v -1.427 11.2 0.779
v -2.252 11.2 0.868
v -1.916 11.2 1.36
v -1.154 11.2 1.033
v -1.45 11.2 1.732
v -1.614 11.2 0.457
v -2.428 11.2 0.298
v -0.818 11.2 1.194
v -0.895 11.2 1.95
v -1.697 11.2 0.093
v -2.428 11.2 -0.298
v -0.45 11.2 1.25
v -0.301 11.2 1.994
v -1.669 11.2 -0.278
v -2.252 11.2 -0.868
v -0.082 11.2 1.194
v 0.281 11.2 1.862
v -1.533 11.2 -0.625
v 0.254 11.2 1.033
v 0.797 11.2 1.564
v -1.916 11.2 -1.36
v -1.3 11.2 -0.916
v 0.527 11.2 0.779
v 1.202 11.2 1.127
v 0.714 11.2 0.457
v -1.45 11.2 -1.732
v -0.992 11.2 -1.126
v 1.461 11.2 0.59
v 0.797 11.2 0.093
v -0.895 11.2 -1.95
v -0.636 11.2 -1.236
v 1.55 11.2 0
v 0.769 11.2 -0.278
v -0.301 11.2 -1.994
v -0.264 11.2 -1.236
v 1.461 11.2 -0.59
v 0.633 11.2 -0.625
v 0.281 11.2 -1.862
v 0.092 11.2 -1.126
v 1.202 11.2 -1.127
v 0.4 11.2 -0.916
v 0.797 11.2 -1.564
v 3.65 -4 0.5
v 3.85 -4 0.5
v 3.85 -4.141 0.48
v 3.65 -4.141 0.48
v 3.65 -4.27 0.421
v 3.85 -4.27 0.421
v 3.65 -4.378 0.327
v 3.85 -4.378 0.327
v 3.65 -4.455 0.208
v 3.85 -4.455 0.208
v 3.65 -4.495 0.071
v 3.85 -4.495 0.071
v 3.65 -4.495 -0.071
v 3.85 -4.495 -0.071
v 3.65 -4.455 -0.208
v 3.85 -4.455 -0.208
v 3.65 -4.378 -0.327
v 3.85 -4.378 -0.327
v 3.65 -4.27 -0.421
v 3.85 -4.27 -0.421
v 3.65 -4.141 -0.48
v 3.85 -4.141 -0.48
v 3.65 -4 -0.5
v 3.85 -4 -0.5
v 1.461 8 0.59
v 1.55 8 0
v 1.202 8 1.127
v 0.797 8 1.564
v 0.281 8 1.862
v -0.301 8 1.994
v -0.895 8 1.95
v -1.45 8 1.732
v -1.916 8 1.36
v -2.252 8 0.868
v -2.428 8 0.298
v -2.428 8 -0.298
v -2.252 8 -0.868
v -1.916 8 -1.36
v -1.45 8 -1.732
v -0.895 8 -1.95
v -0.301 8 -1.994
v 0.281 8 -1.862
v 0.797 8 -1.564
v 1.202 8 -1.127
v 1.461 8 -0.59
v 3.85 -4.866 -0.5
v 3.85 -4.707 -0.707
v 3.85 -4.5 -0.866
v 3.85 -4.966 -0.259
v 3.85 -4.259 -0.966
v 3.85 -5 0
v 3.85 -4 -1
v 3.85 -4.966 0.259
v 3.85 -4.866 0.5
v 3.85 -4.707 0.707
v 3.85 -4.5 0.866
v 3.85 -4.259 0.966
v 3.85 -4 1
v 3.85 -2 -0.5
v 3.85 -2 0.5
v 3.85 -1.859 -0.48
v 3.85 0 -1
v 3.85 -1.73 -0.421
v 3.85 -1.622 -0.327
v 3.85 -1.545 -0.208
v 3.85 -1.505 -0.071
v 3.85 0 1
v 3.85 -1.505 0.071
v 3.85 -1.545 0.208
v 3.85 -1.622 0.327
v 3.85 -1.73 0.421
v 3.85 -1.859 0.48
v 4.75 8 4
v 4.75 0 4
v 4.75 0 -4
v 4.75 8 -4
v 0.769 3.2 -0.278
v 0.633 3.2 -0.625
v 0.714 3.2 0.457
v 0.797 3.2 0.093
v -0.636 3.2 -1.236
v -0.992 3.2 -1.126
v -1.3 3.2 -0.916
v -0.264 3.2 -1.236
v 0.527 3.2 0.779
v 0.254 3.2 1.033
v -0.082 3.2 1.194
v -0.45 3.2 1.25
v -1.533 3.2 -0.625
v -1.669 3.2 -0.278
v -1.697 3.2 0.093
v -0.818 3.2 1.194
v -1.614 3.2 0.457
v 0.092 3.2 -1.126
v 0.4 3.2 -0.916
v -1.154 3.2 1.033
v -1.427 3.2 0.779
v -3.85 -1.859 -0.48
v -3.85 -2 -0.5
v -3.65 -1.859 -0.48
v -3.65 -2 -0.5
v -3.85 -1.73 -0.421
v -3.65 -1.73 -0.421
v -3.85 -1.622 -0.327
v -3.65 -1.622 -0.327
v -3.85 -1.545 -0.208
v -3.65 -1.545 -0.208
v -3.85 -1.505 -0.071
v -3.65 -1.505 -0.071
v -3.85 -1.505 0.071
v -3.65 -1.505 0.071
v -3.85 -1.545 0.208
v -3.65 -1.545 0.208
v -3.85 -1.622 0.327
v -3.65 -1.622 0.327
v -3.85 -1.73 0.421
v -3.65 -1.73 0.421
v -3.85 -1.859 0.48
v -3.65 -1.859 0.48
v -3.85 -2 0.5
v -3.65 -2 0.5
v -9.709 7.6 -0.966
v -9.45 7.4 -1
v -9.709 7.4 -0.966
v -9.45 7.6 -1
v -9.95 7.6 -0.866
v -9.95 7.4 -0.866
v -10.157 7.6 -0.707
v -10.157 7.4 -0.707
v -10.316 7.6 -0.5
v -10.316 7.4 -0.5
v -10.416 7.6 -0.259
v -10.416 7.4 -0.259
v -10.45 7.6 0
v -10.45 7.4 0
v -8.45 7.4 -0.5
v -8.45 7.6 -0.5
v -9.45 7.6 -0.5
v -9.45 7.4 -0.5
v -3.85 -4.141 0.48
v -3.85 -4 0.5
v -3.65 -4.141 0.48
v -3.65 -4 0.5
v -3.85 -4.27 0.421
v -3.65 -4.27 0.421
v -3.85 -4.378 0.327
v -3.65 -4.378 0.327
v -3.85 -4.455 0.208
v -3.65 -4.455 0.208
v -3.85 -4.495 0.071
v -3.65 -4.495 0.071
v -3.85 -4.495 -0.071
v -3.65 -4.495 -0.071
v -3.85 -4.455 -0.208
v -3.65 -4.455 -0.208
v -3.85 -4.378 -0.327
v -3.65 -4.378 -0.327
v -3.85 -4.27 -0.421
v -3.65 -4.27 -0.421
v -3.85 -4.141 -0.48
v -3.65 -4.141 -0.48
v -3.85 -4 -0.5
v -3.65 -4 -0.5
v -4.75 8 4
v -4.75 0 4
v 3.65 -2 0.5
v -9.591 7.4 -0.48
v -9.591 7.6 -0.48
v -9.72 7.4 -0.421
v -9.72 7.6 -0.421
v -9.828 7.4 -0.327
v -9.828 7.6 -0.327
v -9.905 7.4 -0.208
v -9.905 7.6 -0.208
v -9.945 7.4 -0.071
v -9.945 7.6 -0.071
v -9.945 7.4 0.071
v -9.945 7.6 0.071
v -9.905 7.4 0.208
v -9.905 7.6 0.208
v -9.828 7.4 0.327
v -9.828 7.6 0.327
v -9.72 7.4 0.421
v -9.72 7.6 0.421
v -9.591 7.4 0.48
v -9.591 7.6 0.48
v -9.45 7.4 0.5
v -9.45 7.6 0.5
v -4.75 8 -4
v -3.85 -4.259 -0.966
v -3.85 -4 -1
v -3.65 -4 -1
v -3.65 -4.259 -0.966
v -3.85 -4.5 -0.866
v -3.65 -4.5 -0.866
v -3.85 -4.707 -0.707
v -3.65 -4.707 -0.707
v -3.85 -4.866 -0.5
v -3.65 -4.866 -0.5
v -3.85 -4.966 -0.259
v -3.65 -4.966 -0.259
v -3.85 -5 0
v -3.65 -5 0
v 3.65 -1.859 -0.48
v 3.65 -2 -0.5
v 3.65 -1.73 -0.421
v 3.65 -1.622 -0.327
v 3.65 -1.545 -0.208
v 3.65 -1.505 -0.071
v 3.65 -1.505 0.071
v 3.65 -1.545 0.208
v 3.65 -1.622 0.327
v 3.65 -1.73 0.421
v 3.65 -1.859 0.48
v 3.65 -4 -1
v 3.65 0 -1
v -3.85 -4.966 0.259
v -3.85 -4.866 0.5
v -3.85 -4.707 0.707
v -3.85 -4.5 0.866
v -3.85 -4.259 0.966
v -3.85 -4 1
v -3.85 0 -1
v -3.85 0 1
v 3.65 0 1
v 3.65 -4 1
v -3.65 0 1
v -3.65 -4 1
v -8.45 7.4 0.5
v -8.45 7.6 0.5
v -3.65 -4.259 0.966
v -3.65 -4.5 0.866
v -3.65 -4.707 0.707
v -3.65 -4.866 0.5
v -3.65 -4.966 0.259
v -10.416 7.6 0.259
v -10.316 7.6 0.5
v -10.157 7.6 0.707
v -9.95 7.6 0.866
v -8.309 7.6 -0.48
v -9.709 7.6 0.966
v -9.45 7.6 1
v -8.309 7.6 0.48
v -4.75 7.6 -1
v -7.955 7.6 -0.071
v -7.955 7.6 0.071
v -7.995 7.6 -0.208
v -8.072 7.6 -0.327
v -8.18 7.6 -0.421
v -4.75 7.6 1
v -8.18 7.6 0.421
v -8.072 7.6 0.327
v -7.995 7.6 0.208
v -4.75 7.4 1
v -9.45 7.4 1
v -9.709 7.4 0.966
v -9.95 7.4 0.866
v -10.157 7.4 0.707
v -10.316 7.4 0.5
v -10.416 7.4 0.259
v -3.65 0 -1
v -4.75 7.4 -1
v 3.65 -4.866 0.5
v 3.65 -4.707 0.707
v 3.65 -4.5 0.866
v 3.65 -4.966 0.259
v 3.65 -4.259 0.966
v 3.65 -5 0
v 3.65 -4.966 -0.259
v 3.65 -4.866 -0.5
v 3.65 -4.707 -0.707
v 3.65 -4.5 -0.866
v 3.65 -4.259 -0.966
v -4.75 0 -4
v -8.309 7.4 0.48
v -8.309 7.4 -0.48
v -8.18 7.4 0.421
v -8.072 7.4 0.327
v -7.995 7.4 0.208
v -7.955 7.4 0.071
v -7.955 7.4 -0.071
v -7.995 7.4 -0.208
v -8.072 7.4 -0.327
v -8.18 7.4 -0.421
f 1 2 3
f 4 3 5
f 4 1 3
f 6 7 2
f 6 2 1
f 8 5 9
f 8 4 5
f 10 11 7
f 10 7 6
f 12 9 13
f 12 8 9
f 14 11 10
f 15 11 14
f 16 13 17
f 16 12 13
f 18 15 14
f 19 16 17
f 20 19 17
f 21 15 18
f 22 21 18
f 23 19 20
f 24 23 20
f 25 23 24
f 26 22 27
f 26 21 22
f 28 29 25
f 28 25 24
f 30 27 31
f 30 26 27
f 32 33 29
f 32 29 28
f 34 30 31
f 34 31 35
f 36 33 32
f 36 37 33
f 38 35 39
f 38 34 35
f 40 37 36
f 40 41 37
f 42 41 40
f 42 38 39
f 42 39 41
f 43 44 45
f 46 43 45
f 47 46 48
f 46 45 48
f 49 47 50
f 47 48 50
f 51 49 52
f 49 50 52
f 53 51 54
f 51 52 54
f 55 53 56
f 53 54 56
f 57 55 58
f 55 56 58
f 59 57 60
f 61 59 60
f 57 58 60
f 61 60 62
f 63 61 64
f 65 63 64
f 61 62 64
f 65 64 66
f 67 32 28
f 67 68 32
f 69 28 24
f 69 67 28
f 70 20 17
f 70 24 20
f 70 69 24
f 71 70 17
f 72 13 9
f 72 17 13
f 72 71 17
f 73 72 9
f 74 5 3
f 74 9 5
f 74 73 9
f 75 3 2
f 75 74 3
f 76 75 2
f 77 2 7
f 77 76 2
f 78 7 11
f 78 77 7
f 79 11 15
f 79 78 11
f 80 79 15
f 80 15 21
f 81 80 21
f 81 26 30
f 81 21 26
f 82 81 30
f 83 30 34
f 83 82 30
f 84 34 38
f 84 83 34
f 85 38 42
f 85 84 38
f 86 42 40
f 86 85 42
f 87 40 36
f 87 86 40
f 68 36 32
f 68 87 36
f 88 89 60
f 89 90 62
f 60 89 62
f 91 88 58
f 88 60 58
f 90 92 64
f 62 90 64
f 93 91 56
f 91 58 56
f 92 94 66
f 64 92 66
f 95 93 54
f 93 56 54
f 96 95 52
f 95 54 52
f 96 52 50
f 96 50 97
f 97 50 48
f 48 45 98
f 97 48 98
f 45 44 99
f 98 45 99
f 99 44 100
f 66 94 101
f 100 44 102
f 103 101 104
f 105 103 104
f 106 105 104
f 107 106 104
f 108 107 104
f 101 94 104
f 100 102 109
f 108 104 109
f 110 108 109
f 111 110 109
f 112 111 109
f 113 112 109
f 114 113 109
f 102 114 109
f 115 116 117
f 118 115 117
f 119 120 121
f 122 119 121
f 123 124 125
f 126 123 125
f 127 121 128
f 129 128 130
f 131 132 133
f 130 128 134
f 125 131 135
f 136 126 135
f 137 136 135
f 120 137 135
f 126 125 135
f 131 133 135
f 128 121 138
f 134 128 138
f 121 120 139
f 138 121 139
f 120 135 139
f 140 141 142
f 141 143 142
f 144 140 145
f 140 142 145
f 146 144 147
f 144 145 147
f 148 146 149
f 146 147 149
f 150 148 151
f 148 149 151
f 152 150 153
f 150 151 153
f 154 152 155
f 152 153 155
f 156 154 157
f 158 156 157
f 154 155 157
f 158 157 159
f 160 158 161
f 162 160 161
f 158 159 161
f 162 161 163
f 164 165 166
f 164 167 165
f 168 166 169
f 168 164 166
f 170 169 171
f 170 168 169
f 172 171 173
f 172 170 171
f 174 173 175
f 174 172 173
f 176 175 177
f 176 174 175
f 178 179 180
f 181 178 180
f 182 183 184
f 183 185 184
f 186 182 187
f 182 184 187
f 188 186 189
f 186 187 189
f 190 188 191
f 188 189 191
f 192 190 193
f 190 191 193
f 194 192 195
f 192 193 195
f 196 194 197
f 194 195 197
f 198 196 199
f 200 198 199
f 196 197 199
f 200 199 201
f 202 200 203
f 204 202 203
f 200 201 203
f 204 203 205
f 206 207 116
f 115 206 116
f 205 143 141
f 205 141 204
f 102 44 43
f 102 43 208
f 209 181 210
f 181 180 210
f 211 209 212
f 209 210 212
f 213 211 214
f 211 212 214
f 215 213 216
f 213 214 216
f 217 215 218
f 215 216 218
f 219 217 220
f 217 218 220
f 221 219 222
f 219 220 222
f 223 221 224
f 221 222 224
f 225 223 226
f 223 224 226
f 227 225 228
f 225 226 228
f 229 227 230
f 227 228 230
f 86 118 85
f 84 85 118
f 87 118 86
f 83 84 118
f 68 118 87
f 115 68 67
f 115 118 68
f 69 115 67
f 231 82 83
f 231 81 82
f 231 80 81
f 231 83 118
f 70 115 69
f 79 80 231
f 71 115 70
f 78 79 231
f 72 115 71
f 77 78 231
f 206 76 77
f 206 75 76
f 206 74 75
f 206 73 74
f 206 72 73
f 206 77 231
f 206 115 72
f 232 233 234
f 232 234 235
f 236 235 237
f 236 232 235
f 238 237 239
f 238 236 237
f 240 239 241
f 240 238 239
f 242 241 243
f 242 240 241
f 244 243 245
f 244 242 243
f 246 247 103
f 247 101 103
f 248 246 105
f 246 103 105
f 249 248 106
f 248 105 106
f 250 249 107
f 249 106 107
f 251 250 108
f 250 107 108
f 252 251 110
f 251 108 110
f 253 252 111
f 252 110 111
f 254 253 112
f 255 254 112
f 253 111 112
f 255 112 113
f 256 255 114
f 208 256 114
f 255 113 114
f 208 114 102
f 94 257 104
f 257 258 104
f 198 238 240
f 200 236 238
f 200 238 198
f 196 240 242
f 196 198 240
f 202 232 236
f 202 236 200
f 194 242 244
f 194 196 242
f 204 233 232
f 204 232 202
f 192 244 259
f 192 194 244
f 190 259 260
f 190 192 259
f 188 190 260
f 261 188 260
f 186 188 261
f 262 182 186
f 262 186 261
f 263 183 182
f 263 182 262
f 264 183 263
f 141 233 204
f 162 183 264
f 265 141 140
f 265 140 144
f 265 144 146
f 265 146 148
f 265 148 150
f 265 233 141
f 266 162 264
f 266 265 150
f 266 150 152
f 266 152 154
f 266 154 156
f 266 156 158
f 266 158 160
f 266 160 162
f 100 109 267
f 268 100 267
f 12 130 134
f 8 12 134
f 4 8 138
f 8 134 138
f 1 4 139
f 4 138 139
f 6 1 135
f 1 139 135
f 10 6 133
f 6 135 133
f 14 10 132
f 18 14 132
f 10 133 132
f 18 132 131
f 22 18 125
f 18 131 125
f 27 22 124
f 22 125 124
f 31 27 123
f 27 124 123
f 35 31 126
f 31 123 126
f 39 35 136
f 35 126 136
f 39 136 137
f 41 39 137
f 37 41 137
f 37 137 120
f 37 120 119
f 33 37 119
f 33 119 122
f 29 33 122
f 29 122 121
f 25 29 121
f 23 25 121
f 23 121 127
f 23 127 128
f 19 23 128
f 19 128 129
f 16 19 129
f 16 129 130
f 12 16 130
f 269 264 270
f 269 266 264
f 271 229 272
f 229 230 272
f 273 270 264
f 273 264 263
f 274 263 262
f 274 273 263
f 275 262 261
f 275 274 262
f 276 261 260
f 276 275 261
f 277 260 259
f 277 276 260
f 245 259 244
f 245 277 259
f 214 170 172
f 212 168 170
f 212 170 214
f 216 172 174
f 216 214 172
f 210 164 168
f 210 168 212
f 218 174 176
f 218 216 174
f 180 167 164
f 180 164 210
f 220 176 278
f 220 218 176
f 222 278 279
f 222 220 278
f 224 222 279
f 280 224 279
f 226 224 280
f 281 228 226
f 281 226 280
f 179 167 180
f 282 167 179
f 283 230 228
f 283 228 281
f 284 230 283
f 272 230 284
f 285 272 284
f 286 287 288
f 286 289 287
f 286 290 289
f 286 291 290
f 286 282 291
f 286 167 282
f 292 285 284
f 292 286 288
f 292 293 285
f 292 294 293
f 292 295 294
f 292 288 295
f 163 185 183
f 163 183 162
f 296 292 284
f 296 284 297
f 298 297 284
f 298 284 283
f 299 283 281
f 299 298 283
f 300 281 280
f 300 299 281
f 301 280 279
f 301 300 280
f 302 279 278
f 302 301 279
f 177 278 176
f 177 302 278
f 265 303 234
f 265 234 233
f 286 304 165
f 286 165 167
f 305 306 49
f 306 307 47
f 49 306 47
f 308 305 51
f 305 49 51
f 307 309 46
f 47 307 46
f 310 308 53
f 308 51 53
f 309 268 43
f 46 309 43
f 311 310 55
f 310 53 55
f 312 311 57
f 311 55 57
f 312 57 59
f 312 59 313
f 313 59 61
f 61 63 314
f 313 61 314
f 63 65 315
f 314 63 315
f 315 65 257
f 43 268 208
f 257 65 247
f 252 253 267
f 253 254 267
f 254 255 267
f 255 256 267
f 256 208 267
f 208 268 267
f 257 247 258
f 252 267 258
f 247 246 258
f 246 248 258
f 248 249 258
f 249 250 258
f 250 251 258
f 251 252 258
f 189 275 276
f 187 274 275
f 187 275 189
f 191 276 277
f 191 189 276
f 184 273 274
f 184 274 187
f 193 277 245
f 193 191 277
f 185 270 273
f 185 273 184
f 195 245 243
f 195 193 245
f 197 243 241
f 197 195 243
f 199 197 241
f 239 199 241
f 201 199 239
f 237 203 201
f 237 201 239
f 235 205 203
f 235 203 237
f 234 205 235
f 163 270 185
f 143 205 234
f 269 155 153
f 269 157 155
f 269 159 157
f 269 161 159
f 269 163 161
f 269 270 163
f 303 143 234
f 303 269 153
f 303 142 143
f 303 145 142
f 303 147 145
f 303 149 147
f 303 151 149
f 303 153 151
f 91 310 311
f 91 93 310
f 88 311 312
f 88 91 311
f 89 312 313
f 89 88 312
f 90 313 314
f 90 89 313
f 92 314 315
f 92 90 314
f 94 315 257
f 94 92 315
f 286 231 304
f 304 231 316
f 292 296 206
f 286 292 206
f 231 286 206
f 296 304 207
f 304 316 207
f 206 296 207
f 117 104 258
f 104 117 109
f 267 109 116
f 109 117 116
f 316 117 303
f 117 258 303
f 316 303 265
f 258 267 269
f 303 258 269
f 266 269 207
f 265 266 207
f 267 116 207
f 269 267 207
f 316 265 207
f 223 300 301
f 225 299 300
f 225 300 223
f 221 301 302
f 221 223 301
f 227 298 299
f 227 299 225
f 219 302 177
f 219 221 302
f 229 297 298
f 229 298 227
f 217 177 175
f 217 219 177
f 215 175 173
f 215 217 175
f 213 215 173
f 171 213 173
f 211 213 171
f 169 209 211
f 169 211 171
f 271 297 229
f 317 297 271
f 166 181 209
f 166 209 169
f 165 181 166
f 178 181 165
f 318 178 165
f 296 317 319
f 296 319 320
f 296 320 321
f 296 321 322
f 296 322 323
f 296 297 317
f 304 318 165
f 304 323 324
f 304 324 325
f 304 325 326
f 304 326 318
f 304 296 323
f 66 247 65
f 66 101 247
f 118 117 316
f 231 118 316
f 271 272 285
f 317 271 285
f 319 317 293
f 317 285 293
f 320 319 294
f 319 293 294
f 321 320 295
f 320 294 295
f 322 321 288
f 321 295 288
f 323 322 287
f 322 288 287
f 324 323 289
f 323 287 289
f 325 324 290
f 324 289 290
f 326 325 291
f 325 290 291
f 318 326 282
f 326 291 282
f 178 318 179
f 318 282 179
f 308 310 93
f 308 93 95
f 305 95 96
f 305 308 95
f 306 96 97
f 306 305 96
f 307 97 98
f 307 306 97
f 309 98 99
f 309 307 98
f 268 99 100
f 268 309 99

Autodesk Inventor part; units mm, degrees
ref_plane "YZ Plane" through (0, 0, 0) normal (1, 0, 0) x (0, 1, 0)
ref_plane "XZ Plane" through (0, 0, 0) normal (0, 1, 0) x (-1, 0, 0)
ref_plane "XY Plane" through (0, 0, 0) normal (0, 0, 1) x (1, 0, 0)
sketch "Sketch1" plane through (0, 0, 0) normal (0, 1, 0) x (-1, 0, 0)
  line L0 (4.75, 4) -> (-4.75, 4)
  line L1 (-4.75, 4) -> (-4.75, -4)
  line L2 (-4.75, -4) -> (4.75, -4)
  line L3 (4.75, -4) -> (4.75, 4)
  line L4 (4.75, 4) -> (-4.75, -4) construction
  line L5 (-4.75, 4) -> (4.75, -4) construction
  point P0 (0, 0)
  dimension "d0" = 9.5
  dimension "d1" = 8
extrude "Extrusion1" add sketch "Sketch1" along normal blind 8
sketch "Sketch2" plane through (0, 8, 0) normal (0, 1, 0) x (1, 0, 0)
  circle A0 centre (-0.45, 0) radius 2
  line L0 (-4.75, 4) -> (-4.75, -4) projected
  line L1 (4.75, 4) -> (-4.75, 4) projected
  point P0 (0, 0)
  dimension "d4" = 4
  dimension "d5" = 4.3
  dimension "d6" = 4
extrude "Extrusion2" add sketch "Sketch2" along normal blind 3.2
sketch "Sketch3" plane through (-0.45, 11.2, 0) normal (0, 1, 0) x (1, 0, 0)
  point P0 (0.45, 0)
  point P1 (0, 0)
hole "Hole1" at (-0.45, 11.2, 0) direction (0, -1, 0) diameter 2.5 depth 8
sketch "Sketch4" plane through (0, 0, 0) normal (0, -1, 0) x (1, 0, 0)
  line L0 (-3.65, -1) -> (-3.85, -1)
  line L1 (-3.85, -1) -> (-3.85, 1)
  line L2 (-3.85, 1) -> (-3.65, 1)
  line L3 (-3.65, 1) -> (-3.65, -1)
  line L4 (-3.65, -1) -> (-3.85, 1) construction
  line L5 (-3.85, -1) -> (-3.65, 1) construction
  line L6 (3.65, -1) -> (3.85, -1)
  line L7 (3.85, -1) -> (3.85, 1)
  line L8 (3.85, 1) -> (3.65, 1)
  line L9 (3.65, 1) -> (3.65, -1)
  line L10 (3.65, -1) -> (3.85, 1) construction
  line L11 (3.85, -1) -> (3.65, 1) construction
  line L12 (4.75, 4) -> (4.75, -4) projected
  line L13 (-4.75, 4) -> (4.75, 4) projected
  point P0 (0, 0)
  point P1 (-3.75, 0)
  point P2 (3.75, 0)
  point P3 (3.65, 0)
  dimension "d16" = 0.2
  dimension "d17" = 2
  dimension "d18" = 0.2
  dimension "d19" = 2
  dimension "d20" = 7.5
  dimension "d21" = 1
  dimension "d22" = 4
extrude "Extrusion3" add sketch "Sketch4" along normal blind 5
fillet "Fillet1" radius 1 4 edges at (3.75, -5, -1) (3.75, -5, 1) (-3.75, -5, 1) (-3.75, -5, -1)
sketch "Sketch5" plane through (3.85, 0, 1) normal (1, 0, 0) x (0, 0, -1)
  line L0 (1, -2) -> (1, -4) construction
  line L1 (1.5, -2) -> (1.5, -4)
  line L2 (0.5, -4) -> (0.5, -2)
  arc A0 (1.5, -2) -> (0.5, -2) centre (1, -2) ccw
  arc A1 (0.5, -4) -> (1.5, -4) centre (1, -4) ccw
  line L3 (0, 0) -> (0, -4) projected
  arc A2 (0, -4) -> (2, -4) centre (1, -4) ccw projected
  point P0 (1, 0)
  point P1 (1, -3)
  dimension "d26" = 1
  dimension "d27" = 1
  dimension "d28" = 0.5
  dimension "d29" = 0.5
extrude "Extrusion4" cut sketch "Sketch5" against normal through all
sketch "Sketch6" plane through (-4.75, 0, -4) normal (-1, 0, 0) x (0, 0, 1)
  line L0 (3, 7.6) -> (5, 7.6)
  line L1 (5, 7.6) -> (5, 7.4)
  line L2 (5, 7.4) -> (3, 7.4)
  line L3 (3, 7.4) -> (3, 7.6)
  line L4 (3, 7.6) -> (5, 7.4) construction
  line L5 (5, 7.6) -> (3, 7.4) construction
  line L6 (0, 0) -> (0, 8) projected
  line L7 (0, 8) -> (8, 8) projected
  point P0 (4, 0)
  point P1 (4, 7.5)
  dimension "d32" = 2
  dimension "d33" = 0.2
  dimension "d34" = 4
  dimension "d35" = 0.5
extrude "Extrusion5" add sketch "Sketch6" along normal blind 5.7
fillet "Fillet2" radius 1 2 edges at (-10.45, 7.5, 1) (-10.45, 7.5, -1)
sketch "Sketch7" plane through (-4.75, 7.6, 1) normal (0, 1, 0) x (1, 0, 0)
  line L0 (-4.7, 1) -> (-3.7, 1) construction
  line L1 (-4.7, 0.5) -> (-3.7, 0.5)
  line L2 (-3.7, 1.5) -> (-4.7, 1.5)
  arc A0 (-4.7, 1.5) -> (-4.7, 0.5) centre (-4.7, 1) ccw
  arc A1 (-3.7, 0.5) -> (-3.7, 1.5) centre (-3.7, 1) ccw
  line L3 (0, 2) -> (-4.7, 2) projected
  arc A2 (-4.7, 2) -> (-4.7, 0) centre (-4.7, 1) ccw projected
  point P0 (4.75, 1)
  point P1 (-4.2, 1)
  dimension "d39" = 0.5
  dimension "d40" = 1
  dimension "d41" = 0.5
  dimension "d42" = 0.5
extrude "Extrusion6" cut sketch "Sketch7" against normal through all
properties part number "2.5mm jack"
